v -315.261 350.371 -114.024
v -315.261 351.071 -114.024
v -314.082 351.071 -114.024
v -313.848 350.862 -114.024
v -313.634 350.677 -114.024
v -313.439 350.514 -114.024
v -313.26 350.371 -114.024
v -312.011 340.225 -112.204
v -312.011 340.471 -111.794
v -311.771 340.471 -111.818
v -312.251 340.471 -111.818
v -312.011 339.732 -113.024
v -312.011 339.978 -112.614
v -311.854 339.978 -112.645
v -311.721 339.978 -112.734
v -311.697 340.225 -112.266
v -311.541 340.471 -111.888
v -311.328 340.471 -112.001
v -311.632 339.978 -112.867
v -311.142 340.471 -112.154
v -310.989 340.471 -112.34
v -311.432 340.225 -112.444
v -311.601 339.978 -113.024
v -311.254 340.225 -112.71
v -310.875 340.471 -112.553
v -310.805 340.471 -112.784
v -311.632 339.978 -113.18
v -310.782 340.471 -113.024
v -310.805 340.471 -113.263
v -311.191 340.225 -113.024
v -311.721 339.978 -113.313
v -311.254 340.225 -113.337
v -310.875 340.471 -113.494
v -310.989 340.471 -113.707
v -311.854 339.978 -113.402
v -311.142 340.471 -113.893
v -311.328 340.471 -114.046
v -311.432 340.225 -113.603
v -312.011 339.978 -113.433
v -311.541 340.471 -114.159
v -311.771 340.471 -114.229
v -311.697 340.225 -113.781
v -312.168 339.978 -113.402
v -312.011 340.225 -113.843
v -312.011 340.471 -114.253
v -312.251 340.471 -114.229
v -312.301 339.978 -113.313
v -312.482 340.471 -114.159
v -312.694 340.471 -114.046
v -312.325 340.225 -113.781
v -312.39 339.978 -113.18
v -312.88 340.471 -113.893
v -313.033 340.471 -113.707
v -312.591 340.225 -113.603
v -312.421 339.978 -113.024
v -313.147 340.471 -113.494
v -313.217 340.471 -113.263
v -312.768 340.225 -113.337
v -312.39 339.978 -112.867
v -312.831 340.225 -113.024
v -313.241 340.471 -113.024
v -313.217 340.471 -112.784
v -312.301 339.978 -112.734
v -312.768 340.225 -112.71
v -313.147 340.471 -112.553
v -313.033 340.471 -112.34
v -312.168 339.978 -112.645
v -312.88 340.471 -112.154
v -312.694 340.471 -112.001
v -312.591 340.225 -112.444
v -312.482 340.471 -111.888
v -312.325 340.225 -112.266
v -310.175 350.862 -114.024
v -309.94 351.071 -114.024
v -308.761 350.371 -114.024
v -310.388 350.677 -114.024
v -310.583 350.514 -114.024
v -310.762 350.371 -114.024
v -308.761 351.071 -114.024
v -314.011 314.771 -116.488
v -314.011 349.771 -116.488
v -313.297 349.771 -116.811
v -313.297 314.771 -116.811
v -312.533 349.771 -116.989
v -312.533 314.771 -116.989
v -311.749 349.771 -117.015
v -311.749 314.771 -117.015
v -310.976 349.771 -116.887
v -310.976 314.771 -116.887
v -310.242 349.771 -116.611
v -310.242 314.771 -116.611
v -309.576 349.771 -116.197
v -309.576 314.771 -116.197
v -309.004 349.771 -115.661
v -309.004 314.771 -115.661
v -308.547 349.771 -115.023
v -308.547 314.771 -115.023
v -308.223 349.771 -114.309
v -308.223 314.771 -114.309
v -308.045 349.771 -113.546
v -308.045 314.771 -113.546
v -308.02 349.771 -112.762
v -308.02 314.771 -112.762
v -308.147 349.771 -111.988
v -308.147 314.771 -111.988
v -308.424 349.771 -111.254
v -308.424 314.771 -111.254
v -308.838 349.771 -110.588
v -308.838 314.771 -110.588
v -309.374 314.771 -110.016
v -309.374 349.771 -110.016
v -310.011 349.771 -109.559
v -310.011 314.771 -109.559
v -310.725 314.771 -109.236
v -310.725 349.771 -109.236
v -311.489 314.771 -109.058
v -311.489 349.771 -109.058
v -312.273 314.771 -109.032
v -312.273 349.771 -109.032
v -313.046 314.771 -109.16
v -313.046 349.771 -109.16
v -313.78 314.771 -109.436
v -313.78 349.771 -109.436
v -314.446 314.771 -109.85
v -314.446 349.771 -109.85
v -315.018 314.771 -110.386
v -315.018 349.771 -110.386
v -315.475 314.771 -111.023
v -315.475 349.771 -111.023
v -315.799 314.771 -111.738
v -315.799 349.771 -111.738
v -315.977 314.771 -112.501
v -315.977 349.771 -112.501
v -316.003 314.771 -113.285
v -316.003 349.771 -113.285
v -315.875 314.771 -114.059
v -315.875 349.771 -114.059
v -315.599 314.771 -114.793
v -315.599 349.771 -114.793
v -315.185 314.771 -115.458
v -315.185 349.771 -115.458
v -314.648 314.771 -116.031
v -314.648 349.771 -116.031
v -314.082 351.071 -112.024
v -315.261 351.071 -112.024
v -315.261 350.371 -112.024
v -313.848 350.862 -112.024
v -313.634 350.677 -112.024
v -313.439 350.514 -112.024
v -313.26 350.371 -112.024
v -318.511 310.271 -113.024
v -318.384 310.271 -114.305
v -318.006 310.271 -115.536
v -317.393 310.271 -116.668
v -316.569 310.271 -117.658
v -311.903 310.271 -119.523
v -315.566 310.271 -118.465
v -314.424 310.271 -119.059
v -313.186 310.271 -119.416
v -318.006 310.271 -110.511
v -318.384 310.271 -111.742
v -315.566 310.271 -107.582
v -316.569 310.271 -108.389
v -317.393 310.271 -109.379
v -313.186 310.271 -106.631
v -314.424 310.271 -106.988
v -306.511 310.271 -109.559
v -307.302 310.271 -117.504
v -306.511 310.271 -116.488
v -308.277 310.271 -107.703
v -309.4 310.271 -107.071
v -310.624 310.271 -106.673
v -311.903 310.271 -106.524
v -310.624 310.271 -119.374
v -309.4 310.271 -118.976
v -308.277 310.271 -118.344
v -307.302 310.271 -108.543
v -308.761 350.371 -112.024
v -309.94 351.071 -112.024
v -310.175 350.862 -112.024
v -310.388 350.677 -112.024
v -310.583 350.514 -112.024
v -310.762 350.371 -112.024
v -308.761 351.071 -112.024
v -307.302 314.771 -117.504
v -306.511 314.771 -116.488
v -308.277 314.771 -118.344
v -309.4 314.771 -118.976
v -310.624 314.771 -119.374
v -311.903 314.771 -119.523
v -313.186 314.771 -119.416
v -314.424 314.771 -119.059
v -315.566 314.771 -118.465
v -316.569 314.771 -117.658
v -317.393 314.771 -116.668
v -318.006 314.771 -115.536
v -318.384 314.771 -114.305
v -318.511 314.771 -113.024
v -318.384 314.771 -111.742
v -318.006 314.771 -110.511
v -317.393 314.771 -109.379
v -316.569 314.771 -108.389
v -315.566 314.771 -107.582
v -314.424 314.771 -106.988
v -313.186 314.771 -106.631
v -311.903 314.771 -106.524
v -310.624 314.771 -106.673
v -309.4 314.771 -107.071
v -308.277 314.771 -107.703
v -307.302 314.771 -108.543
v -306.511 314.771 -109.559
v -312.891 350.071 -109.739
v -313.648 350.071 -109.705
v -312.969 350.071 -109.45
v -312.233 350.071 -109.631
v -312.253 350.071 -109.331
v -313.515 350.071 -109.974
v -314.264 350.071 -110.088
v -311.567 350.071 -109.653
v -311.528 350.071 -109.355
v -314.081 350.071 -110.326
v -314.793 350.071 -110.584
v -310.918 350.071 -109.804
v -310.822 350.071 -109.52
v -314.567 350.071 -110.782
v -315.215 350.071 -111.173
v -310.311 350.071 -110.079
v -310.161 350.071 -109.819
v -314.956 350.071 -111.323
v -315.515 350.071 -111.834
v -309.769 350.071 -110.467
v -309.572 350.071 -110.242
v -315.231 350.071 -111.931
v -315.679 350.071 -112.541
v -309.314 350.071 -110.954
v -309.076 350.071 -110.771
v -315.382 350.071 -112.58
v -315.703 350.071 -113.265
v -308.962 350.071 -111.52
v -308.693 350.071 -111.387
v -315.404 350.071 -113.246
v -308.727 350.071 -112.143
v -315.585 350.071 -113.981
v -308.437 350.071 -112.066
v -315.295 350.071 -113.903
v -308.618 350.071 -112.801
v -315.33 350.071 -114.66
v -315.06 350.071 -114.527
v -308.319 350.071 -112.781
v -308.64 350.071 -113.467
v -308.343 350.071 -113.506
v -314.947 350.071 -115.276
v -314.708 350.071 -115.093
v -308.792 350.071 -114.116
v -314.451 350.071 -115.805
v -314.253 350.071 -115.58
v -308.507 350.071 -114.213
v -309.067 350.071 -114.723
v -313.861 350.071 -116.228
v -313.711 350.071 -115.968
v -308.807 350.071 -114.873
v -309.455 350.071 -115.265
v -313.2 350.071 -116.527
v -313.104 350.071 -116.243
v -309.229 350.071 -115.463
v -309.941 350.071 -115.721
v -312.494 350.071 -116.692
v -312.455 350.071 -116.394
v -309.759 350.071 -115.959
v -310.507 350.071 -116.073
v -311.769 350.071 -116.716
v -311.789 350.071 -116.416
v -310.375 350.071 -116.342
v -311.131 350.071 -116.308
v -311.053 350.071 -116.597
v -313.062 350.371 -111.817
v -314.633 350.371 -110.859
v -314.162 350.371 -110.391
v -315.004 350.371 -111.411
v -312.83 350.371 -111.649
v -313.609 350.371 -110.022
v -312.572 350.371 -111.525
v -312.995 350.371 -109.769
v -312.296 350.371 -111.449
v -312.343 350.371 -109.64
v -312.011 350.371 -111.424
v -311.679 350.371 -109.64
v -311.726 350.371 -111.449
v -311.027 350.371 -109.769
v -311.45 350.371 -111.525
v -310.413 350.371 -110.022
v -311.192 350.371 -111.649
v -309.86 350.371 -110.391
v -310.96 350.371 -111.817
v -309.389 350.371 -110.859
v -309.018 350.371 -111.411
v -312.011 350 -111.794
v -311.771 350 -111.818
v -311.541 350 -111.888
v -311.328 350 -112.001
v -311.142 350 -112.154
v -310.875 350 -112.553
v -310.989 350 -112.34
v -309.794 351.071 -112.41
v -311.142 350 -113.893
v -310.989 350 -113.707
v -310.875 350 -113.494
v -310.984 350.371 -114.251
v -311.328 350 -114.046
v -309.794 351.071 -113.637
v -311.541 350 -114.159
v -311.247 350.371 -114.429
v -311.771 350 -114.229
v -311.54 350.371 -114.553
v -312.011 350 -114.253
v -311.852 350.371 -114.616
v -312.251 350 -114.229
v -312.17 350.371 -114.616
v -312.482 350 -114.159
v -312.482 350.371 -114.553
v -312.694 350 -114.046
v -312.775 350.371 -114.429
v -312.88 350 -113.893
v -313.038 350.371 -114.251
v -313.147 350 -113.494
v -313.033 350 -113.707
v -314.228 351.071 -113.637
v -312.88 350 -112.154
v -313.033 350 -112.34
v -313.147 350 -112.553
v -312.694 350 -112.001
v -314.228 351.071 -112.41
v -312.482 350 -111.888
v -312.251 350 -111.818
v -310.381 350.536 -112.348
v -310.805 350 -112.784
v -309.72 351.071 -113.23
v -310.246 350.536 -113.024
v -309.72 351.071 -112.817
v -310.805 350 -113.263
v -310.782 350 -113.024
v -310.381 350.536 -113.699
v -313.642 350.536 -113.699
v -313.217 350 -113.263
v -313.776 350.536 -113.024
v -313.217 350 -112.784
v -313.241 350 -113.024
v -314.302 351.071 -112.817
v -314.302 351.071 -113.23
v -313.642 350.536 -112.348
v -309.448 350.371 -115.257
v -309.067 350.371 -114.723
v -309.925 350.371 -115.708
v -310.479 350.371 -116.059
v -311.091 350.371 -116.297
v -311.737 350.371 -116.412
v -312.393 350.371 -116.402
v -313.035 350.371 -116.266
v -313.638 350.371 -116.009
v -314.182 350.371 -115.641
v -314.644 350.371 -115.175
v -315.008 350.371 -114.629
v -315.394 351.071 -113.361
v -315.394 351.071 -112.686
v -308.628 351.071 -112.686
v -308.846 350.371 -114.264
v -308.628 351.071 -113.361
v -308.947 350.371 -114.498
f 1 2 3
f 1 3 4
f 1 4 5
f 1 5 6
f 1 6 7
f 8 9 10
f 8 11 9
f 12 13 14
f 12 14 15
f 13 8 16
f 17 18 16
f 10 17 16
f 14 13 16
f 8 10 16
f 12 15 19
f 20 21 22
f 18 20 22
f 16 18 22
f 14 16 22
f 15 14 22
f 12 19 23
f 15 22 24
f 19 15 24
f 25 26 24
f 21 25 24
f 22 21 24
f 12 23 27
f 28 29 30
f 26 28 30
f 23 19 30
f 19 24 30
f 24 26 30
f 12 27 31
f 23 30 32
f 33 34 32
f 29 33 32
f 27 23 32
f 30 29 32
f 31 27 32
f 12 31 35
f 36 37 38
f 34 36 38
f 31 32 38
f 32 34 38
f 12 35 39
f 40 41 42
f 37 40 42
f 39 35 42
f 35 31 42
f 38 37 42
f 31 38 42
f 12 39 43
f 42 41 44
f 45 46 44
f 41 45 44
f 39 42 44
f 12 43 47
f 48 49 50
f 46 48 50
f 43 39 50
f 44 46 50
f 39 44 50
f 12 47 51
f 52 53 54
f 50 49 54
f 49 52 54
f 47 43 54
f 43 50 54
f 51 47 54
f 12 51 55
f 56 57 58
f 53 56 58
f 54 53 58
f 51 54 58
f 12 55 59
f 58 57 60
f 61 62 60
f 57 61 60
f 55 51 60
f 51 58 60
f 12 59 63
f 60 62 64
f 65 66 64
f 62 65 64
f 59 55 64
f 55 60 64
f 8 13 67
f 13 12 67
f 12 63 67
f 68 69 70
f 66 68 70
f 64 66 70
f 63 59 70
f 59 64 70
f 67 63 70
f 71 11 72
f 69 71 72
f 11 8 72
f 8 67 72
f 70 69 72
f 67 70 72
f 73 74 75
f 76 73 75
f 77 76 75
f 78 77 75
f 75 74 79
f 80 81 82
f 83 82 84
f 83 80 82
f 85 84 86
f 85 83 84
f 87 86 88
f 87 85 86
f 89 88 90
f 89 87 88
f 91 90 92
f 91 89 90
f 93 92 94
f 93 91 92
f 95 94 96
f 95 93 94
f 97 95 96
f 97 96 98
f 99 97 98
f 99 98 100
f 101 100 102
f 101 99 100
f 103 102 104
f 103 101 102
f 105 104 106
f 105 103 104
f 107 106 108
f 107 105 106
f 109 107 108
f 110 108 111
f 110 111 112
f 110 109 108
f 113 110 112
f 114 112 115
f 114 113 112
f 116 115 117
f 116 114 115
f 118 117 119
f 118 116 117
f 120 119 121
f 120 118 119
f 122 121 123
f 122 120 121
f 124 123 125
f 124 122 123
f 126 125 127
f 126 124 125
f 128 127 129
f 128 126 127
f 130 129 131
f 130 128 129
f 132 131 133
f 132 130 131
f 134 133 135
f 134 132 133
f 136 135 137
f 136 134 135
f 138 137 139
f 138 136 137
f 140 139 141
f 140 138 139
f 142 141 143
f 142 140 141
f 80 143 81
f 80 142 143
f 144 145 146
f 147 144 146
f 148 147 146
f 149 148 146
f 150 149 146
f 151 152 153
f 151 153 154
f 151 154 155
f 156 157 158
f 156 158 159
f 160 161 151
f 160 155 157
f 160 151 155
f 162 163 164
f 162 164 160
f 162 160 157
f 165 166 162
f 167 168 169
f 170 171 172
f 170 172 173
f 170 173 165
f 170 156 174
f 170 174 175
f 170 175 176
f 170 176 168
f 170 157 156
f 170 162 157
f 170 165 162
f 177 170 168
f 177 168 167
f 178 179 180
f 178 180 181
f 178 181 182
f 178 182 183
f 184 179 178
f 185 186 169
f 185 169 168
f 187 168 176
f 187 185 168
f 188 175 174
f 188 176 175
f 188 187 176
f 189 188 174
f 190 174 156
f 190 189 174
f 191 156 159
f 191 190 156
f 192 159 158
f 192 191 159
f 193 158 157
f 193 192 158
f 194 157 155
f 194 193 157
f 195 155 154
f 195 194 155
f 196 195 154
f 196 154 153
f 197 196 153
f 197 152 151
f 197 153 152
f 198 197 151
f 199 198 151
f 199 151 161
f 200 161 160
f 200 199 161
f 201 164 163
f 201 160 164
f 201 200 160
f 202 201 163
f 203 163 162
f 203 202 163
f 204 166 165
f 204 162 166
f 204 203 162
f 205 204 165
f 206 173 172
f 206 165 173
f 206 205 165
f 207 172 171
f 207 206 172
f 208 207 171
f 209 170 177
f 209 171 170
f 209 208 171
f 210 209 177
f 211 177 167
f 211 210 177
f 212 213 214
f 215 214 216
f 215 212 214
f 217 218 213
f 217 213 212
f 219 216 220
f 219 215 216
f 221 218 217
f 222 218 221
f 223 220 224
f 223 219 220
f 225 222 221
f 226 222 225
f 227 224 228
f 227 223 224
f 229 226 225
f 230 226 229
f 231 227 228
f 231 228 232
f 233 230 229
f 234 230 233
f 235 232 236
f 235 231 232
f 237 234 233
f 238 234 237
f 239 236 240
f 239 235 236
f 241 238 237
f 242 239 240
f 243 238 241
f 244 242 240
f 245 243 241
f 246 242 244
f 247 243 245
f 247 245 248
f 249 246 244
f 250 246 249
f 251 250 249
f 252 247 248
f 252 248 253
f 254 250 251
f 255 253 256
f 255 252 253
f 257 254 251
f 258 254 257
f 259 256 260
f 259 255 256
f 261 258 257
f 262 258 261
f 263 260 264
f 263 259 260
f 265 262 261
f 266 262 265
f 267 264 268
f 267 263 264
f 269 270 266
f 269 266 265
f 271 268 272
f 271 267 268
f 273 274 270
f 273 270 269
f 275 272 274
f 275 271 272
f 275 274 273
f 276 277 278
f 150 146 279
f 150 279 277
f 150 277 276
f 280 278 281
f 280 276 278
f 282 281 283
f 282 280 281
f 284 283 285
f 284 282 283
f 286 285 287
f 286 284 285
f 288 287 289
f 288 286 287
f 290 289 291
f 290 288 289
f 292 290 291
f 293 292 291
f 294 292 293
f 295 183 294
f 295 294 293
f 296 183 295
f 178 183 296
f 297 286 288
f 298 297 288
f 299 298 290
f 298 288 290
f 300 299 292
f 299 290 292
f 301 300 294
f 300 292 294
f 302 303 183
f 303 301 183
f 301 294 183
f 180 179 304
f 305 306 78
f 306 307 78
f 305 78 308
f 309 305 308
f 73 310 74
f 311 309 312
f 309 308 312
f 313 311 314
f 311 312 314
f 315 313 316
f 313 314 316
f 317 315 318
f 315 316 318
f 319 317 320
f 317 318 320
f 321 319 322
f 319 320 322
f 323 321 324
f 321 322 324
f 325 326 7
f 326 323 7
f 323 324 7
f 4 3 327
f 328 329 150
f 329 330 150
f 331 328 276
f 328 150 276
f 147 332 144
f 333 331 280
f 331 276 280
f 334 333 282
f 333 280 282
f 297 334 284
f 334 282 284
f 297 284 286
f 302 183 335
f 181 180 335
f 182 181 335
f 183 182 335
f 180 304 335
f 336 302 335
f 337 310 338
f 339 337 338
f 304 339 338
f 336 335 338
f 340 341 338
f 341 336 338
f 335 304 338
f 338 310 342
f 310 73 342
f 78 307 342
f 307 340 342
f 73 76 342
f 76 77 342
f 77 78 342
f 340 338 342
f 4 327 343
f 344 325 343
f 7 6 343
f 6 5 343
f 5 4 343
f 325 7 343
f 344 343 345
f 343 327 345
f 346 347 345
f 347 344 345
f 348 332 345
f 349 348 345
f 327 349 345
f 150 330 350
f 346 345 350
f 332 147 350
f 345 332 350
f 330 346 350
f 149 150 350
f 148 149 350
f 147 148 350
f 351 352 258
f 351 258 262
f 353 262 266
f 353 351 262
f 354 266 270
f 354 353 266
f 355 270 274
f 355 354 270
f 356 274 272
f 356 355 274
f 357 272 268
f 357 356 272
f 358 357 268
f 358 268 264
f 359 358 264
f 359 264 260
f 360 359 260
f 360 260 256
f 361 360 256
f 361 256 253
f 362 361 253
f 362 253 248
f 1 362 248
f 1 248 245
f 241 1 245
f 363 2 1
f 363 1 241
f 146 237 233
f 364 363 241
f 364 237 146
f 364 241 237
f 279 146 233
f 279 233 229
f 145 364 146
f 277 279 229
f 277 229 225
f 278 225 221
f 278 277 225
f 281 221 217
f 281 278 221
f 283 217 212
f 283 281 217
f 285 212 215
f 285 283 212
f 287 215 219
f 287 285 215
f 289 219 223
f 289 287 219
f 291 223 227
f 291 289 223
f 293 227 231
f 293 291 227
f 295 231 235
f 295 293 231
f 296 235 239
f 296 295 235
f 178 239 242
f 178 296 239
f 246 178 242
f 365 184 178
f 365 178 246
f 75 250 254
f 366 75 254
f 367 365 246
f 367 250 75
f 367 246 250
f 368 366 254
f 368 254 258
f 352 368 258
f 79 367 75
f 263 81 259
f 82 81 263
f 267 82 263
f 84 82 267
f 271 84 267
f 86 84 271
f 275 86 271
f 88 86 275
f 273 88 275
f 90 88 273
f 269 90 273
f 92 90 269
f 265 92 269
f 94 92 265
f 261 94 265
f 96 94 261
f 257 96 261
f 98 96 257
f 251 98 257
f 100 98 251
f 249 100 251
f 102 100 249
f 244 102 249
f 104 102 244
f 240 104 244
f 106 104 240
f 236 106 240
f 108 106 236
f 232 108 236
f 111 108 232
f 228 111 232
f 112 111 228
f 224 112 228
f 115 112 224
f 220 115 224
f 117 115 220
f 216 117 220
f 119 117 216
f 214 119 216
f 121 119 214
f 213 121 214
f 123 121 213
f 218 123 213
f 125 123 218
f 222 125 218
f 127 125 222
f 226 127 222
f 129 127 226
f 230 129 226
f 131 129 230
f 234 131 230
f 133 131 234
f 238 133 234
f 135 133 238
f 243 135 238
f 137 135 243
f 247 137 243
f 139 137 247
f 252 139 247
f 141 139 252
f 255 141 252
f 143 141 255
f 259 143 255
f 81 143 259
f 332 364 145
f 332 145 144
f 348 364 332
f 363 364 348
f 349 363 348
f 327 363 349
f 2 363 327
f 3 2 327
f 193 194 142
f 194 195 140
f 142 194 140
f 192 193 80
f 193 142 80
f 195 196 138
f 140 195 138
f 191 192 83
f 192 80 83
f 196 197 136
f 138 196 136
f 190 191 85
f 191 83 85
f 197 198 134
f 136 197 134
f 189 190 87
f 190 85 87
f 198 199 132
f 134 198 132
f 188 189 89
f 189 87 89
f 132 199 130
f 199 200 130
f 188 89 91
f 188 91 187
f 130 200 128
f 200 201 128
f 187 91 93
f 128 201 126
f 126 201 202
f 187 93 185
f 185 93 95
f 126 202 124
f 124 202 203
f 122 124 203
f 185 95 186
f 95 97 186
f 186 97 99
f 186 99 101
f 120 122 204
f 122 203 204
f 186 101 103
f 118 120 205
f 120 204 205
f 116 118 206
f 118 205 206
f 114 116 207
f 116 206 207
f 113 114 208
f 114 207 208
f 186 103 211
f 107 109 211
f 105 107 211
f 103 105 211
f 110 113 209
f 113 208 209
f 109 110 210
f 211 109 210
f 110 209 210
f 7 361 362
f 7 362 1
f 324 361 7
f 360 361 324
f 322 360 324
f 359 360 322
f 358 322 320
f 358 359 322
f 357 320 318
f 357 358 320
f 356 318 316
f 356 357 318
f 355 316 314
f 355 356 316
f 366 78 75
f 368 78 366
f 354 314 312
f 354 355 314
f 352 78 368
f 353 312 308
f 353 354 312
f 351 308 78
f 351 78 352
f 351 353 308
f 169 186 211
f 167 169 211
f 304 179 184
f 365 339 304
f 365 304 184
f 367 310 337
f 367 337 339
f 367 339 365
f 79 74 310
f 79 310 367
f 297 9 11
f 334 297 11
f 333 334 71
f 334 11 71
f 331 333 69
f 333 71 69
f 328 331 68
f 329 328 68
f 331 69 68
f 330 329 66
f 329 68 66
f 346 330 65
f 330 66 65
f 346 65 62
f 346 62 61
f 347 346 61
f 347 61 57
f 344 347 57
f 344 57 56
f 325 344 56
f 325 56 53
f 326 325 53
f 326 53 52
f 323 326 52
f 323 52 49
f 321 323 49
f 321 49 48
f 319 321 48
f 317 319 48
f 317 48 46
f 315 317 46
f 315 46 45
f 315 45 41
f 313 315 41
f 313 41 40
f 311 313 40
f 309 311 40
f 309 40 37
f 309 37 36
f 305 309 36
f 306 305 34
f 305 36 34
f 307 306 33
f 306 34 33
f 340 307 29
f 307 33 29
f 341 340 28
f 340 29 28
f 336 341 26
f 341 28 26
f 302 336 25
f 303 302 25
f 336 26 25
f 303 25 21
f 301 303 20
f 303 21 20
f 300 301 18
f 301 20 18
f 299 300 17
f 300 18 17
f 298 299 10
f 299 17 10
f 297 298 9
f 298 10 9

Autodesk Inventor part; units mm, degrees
ref_plane "YZ Plane" through (0, 0, 0) normal (1, 0, 0) x (0, 1, 0)
ref_plane "XZ Plane" through (0, 0, 0) normal (0, 1, 0) x (-1, 0, 0)
ref_plane "XY Plane" through (0, 0, 0) normal (0, 0, 1) x (1, 0, 0)
ref_plane "Work Plane1" through (-112.0932, 314.7709, -230.7555) normal (0, 1, 0) x (-0.5, 0, -0.866)
sketch "Sketch1" plane through (-112.0932, 314.7709, -230.7555) normal (0, 1, 0) x (-0.5, 0, -0.866)
  circle A0 centre (-2, 232) radius 4
  point P0 (-255.8867, 18.3022)
  dimension "d0" = 8
extrude "Extrusion1" add sketch "Sketch1" along normal blind 36.5
sketch "Sketch2" plane through (-312.0111, 314.7709, -113.0235) normal (0, -1, 0) x (1, 0, 0)
  circle A0 centre (0, 0) radius 4 projected
  arc A1 (5.5, 3.4641) -> (5.5, -3.4641) centre (0, 0) ccw
  line L0 (5.5, -3.4641) -> (5.5, 3.4641)
  point P0 (312.0111, 113.0235)
  dimension "d3" = 13
  dimension "d29" = 5.5
extrude "Extrusion2" add sketch "Sketch2" along normal blind 4.5 contours A0 | L0 A1
thread "Thread1" size "M8x1.25" class "6g" standard "ANSI Metric M Profile" length 21
ref_plane "Work Plane2" through (-312.0111, 351.2709, -113.0235) normal (0, 1, 0) x (1, 0, 0)
sketch "Sketch4" plane through (-312.0111, 351.2709, -113.0235) normal (0, 1, 0) x (1, 0, 0)
  circle A0 centre (0, 0) radius 3.7 projected
  line L0 (-11, 1) -> (10, 1)
  line L1 (-11, -1) -> (13, -1)
  line L2 (-11, 1) -> (3, 13)
  line L3 (3, 13) -> (10, 1)
  line L4 (-11, -1) -> (8, -15)
  line L5 (8, -15) -> (13, -1)
  point P0 (312.0111, -113.0235)
  dimension "d16" = 1
  dimension "d17" = 1
extrude "Extrusion4" cut sketch "Sketch4" against normal blind 0.9 contours L0 A0 | A0 L0 L2 L3 | L1 L5 L4 A0 | A0 L1
sketch "Sketch5" plane through (-112.0932, 351.2709, -230.7555) normal (0, 1, 0) x (0.866, 0, -0.5)
  arc A0 (-229.415, -4.6472) -> (-228.415, -2.9151) centre (-232, -2) ccw projected
  point P0 (-18.3022, -255.8867)
hole "Hole1" at (-312.0111, 351.2709, -113.0235) direction (0, -1, 0) diameter 2.459 depth 10.8 tip angle 118 countersink diameter 5 countersink angle 90 thread size "M3x0.5" class "6H" standard "ISO Metric profile"
sketch "Sketch6" plane through (-112.0932, 351.2709, -230.7555) normal (0, 1, 0) x (0.866, 0, -0.5)
  arc A0 (-229.415, -4.6472) -> (-228.415, -2.9151) centre (-232, -2) ccw projected
  circle A1 centre (-232, -2) radius 10.2956
  point P0 (-18.3022, -255.8867)
extrude "Extrusion5" cut sketch "Sketch6" against normal blind 0.2
sketch "Sketch7" plane through (-112.0932, 351.0709, -230.7555) normal (0, 1, 0) x (0.866, 0, -0.5)
  arc A0 (-230.7063, -3.9016) -> (-229.7063, -2.1696) centre (-232, -2) ccw projected
  circle A1 centre (-232, -2) radius 3.4
  circle A2 centre (-232, -2) radius 1.2295 projected
  circle A3 centre (-232, -2) radius 5.5146
  point P0 (-18.3022, -255.8867)
  dimension "d30" = 6.8
extrude "Extrusion6" cut sketch "Sketch7" against normal blind 1 contours A3
chamfer "Chamfer2" distance 0.3 angle 45 1 edges at (-310.0111, 350.0709, -109.5594)
properties part number "BOLT" material "Stainless Steel"
